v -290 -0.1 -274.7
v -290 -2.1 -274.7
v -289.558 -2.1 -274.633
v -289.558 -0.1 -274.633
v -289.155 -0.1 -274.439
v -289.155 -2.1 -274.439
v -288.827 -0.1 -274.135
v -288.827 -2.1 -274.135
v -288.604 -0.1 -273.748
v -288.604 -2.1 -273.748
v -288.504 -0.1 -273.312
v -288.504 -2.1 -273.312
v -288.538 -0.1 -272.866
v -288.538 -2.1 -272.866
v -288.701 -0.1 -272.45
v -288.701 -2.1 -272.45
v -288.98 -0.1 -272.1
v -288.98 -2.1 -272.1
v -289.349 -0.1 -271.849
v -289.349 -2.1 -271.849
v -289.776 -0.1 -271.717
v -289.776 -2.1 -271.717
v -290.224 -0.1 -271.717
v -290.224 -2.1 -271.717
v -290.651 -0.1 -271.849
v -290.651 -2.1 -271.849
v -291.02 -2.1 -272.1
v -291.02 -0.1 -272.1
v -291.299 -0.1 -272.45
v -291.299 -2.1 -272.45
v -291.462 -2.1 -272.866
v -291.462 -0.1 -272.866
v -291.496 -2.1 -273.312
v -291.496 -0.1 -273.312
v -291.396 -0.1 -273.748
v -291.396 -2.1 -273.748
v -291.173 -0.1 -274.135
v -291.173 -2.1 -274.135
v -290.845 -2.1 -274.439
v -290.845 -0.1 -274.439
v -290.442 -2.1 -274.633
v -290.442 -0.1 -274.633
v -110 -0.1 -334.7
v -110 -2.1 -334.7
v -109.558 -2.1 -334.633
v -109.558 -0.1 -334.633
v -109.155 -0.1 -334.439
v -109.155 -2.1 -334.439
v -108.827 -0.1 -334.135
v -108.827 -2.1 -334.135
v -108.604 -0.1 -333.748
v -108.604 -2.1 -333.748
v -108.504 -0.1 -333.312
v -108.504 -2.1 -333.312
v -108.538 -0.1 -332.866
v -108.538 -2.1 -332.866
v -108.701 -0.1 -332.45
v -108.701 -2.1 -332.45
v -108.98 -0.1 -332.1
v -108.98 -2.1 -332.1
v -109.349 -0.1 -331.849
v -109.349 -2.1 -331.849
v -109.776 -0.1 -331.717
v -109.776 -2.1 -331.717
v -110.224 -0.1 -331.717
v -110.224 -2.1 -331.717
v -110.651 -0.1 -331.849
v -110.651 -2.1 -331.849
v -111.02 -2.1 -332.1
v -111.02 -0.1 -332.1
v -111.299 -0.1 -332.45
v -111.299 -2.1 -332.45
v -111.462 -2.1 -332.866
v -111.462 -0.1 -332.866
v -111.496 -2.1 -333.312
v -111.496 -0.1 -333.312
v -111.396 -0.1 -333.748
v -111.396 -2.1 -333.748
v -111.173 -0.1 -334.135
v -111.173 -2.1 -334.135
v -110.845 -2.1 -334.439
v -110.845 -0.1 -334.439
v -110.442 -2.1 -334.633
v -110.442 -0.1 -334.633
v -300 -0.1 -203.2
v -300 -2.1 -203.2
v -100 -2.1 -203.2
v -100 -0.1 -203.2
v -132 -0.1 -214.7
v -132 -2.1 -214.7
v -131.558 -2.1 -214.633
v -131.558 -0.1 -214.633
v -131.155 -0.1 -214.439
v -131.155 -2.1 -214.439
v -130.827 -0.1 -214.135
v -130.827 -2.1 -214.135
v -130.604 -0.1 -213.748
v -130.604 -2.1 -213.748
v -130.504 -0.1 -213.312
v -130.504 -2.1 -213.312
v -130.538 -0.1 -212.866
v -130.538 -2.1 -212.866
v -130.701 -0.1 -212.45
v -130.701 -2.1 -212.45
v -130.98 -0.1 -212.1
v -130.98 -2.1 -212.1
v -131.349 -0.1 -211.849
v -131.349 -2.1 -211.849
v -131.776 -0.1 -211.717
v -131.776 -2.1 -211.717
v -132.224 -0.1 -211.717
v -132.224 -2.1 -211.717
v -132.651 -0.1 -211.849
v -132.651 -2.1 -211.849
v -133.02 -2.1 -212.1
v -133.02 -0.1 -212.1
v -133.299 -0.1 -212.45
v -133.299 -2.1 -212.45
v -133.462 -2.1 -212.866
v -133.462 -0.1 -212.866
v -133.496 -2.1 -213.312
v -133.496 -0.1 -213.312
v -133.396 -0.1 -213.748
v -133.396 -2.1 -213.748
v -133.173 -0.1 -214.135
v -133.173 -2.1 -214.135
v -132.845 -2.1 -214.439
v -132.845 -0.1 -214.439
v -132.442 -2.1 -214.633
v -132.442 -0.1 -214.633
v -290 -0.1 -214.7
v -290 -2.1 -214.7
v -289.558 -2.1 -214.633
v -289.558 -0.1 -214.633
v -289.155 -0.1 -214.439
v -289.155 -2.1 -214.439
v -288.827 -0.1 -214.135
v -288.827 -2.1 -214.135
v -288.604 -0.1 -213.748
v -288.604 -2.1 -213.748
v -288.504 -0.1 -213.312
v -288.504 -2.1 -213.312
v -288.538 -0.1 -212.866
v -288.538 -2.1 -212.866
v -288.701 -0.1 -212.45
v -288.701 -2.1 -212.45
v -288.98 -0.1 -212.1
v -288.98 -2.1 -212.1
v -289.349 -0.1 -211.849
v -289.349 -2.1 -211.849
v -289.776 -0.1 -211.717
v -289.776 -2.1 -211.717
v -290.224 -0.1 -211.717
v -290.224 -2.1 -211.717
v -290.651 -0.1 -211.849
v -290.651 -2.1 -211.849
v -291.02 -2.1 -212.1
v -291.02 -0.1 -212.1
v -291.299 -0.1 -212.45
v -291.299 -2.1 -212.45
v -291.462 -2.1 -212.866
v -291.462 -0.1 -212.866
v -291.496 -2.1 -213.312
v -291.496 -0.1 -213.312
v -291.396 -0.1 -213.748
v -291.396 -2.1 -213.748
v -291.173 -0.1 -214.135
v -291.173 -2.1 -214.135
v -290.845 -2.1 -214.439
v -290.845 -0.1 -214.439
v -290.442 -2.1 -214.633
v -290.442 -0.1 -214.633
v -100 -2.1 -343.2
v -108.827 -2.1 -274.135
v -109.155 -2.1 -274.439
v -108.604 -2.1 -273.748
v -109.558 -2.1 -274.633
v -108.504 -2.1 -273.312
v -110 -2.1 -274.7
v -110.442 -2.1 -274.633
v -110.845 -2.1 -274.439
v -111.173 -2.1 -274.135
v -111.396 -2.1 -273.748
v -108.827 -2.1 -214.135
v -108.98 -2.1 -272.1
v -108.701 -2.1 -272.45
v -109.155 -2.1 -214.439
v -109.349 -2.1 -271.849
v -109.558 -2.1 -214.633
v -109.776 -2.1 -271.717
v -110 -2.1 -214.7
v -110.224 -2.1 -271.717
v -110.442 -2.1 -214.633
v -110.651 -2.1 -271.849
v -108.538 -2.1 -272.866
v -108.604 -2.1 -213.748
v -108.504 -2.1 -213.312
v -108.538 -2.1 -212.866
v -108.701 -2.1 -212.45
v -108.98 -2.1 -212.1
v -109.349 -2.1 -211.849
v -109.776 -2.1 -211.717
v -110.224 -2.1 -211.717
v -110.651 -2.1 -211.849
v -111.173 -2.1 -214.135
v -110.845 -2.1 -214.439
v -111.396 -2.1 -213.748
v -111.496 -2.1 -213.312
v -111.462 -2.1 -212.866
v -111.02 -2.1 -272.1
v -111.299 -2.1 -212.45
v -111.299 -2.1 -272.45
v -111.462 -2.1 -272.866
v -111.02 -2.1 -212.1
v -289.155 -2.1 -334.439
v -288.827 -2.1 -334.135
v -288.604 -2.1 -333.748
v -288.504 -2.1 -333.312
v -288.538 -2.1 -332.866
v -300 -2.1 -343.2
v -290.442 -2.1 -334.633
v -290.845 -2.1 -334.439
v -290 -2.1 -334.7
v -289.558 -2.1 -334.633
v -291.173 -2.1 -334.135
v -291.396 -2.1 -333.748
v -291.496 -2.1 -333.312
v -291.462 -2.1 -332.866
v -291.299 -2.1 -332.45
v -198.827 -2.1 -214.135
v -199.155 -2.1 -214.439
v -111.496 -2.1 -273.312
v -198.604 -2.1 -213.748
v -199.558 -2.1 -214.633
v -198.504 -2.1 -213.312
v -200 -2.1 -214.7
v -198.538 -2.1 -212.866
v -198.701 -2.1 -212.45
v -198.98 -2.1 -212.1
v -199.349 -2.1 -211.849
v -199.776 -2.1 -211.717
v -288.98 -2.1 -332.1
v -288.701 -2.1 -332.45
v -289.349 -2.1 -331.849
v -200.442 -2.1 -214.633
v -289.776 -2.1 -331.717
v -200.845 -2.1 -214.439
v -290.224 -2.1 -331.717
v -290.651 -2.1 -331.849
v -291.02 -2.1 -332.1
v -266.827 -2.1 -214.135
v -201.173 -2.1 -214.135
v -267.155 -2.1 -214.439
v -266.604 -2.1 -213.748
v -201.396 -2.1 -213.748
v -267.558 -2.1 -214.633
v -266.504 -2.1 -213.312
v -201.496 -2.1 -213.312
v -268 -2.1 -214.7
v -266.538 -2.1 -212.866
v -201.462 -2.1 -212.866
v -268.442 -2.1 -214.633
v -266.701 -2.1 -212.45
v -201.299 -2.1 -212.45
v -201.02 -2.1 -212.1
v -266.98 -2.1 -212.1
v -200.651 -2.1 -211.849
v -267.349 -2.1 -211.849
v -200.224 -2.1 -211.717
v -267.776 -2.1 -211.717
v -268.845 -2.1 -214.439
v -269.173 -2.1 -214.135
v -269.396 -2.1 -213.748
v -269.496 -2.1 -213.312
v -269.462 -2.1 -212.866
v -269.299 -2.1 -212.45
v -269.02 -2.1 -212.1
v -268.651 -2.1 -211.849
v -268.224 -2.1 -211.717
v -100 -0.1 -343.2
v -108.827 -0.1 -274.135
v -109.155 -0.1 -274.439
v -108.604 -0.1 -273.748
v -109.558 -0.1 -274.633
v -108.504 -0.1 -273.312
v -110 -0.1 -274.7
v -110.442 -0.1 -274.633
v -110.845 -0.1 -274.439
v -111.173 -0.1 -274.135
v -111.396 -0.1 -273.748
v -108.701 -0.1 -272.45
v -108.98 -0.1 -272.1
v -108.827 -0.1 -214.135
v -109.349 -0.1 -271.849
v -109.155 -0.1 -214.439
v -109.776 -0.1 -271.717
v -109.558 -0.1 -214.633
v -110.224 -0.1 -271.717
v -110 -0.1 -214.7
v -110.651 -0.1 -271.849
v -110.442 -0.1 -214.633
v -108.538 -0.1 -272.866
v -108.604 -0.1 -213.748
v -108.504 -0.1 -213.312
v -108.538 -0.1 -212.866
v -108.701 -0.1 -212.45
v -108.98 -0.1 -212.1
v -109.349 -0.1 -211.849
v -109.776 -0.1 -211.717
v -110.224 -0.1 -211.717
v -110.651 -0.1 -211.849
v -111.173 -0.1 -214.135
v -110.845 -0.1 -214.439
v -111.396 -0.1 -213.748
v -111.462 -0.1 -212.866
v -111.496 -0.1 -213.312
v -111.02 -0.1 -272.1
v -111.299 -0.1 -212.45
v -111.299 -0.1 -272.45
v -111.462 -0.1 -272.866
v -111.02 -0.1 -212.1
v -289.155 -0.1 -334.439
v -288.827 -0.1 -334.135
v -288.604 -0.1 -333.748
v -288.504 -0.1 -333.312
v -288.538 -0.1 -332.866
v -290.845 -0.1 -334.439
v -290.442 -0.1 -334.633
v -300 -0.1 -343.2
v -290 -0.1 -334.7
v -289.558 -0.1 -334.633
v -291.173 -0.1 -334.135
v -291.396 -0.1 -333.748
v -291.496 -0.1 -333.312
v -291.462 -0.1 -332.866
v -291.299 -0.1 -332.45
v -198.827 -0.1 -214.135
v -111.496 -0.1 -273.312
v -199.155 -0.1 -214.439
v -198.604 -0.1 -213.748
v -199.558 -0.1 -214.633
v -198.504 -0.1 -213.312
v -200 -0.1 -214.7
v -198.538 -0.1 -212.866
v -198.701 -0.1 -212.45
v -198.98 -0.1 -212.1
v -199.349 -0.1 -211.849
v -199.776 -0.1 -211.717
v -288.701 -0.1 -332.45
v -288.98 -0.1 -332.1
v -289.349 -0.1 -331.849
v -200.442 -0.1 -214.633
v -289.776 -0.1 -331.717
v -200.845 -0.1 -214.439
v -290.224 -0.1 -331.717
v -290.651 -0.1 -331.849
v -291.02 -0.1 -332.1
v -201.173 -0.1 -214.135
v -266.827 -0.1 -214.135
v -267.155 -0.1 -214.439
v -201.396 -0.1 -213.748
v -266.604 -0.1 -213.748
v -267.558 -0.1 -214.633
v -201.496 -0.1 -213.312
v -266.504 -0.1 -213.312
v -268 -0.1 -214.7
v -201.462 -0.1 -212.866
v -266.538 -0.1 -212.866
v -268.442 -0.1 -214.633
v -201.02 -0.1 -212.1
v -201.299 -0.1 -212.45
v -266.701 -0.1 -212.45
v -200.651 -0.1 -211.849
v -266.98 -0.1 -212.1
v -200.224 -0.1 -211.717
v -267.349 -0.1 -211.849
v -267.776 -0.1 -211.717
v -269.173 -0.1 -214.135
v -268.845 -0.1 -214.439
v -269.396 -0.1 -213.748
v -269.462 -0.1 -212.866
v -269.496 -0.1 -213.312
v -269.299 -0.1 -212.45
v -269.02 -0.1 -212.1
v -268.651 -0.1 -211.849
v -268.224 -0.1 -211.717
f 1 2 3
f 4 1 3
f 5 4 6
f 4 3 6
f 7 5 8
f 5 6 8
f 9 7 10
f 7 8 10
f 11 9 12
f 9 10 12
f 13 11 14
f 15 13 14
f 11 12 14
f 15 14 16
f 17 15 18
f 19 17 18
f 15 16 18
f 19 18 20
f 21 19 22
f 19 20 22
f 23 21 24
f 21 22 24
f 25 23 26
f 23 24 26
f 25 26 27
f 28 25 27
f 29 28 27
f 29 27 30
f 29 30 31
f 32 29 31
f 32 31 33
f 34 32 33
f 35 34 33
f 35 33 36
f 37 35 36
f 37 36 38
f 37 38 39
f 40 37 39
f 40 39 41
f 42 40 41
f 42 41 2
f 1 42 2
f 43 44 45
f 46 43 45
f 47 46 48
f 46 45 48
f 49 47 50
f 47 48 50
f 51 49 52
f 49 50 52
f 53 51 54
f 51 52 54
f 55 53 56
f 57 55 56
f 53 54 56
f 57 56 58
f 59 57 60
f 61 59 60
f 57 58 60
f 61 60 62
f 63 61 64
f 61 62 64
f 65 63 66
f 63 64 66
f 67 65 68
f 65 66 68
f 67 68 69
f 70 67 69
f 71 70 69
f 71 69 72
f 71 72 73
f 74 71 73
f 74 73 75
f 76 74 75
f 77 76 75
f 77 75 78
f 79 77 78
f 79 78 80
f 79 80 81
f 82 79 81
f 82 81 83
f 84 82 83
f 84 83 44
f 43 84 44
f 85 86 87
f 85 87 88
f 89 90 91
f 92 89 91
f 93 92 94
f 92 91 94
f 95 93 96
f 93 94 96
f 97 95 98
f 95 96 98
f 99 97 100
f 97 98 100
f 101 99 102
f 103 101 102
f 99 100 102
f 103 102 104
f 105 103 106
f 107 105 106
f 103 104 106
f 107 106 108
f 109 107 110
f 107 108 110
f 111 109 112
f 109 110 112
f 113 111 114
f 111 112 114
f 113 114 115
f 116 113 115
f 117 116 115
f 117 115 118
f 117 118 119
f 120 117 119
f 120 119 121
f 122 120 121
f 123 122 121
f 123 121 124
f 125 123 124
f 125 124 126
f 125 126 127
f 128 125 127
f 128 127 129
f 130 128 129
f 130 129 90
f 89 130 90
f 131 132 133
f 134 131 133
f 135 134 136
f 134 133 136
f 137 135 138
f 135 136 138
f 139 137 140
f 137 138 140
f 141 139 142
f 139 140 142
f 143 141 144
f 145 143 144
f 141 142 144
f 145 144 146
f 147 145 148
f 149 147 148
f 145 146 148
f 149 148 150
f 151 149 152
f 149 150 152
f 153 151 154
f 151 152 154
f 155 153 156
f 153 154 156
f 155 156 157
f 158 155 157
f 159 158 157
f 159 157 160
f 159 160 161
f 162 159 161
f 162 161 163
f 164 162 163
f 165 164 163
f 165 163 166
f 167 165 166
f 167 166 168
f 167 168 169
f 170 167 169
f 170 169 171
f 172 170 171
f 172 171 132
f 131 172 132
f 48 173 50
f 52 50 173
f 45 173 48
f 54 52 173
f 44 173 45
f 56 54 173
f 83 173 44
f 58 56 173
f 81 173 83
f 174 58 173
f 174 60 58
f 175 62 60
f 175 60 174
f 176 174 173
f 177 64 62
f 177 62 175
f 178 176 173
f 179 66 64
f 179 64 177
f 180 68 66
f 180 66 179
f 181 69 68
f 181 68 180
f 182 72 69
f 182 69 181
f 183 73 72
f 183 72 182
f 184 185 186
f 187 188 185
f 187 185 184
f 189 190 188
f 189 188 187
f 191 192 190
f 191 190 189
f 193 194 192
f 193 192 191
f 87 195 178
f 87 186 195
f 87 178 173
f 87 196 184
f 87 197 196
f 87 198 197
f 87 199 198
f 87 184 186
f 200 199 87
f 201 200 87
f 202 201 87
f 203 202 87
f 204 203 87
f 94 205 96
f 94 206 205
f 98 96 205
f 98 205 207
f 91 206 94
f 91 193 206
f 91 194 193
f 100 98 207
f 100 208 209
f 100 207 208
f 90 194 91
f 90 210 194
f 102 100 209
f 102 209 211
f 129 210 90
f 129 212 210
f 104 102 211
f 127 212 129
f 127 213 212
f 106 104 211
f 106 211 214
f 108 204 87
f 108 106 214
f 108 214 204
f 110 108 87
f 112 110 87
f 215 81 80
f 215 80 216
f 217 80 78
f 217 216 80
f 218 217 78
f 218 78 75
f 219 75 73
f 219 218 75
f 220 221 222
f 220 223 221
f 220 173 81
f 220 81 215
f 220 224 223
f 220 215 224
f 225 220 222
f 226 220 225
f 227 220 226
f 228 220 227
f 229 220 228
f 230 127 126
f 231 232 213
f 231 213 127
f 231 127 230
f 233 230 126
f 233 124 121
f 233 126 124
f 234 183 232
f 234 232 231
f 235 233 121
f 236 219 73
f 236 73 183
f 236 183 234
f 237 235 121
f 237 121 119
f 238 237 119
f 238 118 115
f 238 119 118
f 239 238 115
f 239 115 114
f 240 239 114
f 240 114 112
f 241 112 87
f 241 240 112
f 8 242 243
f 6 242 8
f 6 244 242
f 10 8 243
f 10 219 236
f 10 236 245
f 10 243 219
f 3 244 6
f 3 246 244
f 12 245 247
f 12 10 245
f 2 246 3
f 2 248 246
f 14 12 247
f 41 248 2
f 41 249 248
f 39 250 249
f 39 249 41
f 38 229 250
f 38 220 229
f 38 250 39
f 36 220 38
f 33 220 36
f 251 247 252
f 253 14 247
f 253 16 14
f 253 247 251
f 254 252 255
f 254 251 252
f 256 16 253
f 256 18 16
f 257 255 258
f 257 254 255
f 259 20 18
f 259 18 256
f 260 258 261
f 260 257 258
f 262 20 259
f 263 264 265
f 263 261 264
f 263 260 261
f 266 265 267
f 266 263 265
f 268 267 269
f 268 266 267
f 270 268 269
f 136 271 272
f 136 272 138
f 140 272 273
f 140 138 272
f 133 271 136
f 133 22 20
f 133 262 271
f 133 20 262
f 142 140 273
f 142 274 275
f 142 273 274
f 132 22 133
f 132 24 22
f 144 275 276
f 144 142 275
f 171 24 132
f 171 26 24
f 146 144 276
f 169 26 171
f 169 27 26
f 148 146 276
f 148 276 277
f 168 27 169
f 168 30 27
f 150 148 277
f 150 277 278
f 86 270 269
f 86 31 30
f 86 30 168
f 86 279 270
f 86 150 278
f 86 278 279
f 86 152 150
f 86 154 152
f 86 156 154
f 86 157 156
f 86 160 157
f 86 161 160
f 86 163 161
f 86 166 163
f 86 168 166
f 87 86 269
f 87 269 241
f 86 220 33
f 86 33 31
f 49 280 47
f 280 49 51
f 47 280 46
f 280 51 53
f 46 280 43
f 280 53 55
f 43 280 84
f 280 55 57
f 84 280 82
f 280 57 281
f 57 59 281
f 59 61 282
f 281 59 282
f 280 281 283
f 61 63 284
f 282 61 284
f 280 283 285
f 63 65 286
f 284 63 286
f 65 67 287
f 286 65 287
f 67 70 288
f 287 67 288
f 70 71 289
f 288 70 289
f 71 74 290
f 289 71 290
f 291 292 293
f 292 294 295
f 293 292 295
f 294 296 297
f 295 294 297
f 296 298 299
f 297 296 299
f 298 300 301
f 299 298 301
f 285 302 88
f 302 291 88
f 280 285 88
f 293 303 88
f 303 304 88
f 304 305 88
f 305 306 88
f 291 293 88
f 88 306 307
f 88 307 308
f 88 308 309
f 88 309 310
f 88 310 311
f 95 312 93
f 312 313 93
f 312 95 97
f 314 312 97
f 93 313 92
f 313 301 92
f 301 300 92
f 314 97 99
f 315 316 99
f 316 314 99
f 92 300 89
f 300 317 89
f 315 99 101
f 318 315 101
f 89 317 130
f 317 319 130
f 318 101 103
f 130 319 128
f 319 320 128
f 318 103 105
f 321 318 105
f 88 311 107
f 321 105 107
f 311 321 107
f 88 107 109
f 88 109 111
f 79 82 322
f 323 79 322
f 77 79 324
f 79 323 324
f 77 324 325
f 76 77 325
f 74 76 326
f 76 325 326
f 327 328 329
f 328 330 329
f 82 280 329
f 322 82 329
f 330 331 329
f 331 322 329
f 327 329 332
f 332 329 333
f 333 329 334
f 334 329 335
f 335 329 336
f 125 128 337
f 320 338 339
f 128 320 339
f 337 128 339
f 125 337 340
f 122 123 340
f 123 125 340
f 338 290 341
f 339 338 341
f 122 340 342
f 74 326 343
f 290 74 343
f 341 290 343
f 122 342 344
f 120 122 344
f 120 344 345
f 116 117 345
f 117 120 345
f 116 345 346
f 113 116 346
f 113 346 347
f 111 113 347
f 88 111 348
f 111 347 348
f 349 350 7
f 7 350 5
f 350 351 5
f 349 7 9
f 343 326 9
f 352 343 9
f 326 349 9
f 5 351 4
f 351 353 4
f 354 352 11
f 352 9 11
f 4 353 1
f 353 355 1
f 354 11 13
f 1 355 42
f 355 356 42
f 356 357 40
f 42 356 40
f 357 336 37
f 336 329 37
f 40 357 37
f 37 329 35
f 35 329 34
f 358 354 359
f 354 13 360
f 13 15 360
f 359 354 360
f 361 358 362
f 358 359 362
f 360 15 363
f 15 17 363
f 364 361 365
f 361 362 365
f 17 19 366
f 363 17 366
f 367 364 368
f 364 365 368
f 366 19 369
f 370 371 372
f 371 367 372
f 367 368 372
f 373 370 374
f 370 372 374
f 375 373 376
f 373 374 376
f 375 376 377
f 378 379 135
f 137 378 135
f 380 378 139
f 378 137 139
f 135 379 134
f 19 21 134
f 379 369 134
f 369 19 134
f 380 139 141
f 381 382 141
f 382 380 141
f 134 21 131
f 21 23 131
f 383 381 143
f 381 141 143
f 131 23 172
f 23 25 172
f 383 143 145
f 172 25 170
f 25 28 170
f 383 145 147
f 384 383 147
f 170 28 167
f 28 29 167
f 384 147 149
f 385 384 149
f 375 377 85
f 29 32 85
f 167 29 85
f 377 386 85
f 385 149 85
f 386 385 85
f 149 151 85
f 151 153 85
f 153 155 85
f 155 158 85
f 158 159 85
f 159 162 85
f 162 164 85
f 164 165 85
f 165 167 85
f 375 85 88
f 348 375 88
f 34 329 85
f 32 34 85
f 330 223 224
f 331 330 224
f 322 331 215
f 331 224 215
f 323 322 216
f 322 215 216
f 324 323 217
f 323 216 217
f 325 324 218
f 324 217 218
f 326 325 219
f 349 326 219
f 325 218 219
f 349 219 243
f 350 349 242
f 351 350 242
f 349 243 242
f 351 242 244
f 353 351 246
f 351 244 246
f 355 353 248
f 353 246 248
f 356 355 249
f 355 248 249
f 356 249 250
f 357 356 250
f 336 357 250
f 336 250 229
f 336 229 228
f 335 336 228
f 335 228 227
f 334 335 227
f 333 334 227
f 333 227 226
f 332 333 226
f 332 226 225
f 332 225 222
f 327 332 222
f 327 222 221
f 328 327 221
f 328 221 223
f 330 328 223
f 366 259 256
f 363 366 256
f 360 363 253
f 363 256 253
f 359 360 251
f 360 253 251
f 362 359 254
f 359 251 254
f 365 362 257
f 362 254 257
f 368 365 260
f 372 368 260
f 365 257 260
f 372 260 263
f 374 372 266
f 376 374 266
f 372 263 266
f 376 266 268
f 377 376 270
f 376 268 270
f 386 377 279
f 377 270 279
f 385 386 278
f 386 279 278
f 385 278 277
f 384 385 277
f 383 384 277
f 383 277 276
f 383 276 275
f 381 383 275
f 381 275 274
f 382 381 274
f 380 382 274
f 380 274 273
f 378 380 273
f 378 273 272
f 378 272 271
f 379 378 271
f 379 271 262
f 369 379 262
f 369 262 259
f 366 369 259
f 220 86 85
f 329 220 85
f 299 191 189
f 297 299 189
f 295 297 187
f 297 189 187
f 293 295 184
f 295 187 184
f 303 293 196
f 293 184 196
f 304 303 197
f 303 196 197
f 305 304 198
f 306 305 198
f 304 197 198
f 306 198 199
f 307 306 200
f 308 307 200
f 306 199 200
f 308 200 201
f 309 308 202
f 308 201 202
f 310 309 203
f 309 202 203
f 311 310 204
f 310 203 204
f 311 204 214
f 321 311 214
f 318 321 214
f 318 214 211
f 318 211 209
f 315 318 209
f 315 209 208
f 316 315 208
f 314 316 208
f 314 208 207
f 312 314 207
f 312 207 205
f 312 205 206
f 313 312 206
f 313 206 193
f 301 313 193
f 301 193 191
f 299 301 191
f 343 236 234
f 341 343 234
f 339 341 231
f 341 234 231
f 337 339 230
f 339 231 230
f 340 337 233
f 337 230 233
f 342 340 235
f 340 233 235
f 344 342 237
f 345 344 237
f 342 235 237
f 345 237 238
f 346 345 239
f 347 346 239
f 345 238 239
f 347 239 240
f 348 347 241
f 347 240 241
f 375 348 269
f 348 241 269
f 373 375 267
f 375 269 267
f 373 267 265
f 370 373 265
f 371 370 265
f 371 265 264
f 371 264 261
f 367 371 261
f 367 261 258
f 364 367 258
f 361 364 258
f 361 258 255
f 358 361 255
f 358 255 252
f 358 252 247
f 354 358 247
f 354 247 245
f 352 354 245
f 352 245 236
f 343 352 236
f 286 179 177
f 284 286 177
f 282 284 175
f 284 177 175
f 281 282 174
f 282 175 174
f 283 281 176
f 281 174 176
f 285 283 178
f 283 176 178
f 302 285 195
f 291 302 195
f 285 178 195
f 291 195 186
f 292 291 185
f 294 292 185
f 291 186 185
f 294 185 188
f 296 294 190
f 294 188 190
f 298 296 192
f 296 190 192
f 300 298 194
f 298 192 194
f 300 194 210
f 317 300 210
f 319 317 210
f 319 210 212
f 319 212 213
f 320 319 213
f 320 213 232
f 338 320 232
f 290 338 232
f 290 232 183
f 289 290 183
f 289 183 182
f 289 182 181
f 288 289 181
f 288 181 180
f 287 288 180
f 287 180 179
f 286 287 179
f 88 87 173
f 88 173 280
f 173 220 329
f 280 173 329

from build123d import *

# Parameters (mm, degrees)
SKETCH051_W     = 2
SKETCH051_H     = 140
PAD031_DEPTH    = 200
SKETCH040_R     = 1.5
POCKET016_DEPTH = 5
SKETCH088_R     = 1.5
POCKET046_DEPTH = 5


with BuildPart() as part:
    # Sketch051 → Pad031 (new body)
    with BuildSketch(Plane.YZ):
        with Locations((1, 70)):
            Rectangle(SKETCH051_W, SKETCH051_H)
    extrude(amount=PAD031_DEPTH)

    # Sketch040 (on Face1 of Pad031) → Pocket016 (cut)
    with BuildSketch(Plane(origin=(0, 0, 0), x_dir=(0, 0, -1), z_dir=(0, -1, 0))):
        with Locations((-130, 190)):
            Circle(SKETCH040_R)
        with Locations((-70, 190)):
            Circle(SKETCH040_R)
        with Locations((-10, 190)):
            Circle(SKETCH040_R)
        with Locations((-10, 10)):
            Circle(SKETCH040_R)
        with Locations((-70, 10)):
            Circle(SKETCH040_R)
        with Locations((-130, 10)):
            Circle(SKETCH040_R)
    extrude(amount=-POCKET016_DEPTH, mode=Mode.SUBTRACT)

    # Sketch088 (on Face1 of Pocket016) → Pocket046 (cut)
    with BuildSketch(Plane(origin=(0, 0, 0), x_dir=(0, 0, -1), z_dir=(0, -1, 0))):
        with Locations((-130, 32)):
            Circle(SKETCH088_R)
        with Locations((-130, 100)):
            Circle(SKETCH088_R)
        with Locations((-130, 168)):
            Circle(SKETCH088_R)
    extrude(amount=-POCKET046_DEPTH, mode=Mode.SUBTRACT)


with BuildPart() as part_1:
    # Body031 placement: moved
    add(part.part.moved(Location((-300, -2.1, -343.2))))


solid = part_1.part
